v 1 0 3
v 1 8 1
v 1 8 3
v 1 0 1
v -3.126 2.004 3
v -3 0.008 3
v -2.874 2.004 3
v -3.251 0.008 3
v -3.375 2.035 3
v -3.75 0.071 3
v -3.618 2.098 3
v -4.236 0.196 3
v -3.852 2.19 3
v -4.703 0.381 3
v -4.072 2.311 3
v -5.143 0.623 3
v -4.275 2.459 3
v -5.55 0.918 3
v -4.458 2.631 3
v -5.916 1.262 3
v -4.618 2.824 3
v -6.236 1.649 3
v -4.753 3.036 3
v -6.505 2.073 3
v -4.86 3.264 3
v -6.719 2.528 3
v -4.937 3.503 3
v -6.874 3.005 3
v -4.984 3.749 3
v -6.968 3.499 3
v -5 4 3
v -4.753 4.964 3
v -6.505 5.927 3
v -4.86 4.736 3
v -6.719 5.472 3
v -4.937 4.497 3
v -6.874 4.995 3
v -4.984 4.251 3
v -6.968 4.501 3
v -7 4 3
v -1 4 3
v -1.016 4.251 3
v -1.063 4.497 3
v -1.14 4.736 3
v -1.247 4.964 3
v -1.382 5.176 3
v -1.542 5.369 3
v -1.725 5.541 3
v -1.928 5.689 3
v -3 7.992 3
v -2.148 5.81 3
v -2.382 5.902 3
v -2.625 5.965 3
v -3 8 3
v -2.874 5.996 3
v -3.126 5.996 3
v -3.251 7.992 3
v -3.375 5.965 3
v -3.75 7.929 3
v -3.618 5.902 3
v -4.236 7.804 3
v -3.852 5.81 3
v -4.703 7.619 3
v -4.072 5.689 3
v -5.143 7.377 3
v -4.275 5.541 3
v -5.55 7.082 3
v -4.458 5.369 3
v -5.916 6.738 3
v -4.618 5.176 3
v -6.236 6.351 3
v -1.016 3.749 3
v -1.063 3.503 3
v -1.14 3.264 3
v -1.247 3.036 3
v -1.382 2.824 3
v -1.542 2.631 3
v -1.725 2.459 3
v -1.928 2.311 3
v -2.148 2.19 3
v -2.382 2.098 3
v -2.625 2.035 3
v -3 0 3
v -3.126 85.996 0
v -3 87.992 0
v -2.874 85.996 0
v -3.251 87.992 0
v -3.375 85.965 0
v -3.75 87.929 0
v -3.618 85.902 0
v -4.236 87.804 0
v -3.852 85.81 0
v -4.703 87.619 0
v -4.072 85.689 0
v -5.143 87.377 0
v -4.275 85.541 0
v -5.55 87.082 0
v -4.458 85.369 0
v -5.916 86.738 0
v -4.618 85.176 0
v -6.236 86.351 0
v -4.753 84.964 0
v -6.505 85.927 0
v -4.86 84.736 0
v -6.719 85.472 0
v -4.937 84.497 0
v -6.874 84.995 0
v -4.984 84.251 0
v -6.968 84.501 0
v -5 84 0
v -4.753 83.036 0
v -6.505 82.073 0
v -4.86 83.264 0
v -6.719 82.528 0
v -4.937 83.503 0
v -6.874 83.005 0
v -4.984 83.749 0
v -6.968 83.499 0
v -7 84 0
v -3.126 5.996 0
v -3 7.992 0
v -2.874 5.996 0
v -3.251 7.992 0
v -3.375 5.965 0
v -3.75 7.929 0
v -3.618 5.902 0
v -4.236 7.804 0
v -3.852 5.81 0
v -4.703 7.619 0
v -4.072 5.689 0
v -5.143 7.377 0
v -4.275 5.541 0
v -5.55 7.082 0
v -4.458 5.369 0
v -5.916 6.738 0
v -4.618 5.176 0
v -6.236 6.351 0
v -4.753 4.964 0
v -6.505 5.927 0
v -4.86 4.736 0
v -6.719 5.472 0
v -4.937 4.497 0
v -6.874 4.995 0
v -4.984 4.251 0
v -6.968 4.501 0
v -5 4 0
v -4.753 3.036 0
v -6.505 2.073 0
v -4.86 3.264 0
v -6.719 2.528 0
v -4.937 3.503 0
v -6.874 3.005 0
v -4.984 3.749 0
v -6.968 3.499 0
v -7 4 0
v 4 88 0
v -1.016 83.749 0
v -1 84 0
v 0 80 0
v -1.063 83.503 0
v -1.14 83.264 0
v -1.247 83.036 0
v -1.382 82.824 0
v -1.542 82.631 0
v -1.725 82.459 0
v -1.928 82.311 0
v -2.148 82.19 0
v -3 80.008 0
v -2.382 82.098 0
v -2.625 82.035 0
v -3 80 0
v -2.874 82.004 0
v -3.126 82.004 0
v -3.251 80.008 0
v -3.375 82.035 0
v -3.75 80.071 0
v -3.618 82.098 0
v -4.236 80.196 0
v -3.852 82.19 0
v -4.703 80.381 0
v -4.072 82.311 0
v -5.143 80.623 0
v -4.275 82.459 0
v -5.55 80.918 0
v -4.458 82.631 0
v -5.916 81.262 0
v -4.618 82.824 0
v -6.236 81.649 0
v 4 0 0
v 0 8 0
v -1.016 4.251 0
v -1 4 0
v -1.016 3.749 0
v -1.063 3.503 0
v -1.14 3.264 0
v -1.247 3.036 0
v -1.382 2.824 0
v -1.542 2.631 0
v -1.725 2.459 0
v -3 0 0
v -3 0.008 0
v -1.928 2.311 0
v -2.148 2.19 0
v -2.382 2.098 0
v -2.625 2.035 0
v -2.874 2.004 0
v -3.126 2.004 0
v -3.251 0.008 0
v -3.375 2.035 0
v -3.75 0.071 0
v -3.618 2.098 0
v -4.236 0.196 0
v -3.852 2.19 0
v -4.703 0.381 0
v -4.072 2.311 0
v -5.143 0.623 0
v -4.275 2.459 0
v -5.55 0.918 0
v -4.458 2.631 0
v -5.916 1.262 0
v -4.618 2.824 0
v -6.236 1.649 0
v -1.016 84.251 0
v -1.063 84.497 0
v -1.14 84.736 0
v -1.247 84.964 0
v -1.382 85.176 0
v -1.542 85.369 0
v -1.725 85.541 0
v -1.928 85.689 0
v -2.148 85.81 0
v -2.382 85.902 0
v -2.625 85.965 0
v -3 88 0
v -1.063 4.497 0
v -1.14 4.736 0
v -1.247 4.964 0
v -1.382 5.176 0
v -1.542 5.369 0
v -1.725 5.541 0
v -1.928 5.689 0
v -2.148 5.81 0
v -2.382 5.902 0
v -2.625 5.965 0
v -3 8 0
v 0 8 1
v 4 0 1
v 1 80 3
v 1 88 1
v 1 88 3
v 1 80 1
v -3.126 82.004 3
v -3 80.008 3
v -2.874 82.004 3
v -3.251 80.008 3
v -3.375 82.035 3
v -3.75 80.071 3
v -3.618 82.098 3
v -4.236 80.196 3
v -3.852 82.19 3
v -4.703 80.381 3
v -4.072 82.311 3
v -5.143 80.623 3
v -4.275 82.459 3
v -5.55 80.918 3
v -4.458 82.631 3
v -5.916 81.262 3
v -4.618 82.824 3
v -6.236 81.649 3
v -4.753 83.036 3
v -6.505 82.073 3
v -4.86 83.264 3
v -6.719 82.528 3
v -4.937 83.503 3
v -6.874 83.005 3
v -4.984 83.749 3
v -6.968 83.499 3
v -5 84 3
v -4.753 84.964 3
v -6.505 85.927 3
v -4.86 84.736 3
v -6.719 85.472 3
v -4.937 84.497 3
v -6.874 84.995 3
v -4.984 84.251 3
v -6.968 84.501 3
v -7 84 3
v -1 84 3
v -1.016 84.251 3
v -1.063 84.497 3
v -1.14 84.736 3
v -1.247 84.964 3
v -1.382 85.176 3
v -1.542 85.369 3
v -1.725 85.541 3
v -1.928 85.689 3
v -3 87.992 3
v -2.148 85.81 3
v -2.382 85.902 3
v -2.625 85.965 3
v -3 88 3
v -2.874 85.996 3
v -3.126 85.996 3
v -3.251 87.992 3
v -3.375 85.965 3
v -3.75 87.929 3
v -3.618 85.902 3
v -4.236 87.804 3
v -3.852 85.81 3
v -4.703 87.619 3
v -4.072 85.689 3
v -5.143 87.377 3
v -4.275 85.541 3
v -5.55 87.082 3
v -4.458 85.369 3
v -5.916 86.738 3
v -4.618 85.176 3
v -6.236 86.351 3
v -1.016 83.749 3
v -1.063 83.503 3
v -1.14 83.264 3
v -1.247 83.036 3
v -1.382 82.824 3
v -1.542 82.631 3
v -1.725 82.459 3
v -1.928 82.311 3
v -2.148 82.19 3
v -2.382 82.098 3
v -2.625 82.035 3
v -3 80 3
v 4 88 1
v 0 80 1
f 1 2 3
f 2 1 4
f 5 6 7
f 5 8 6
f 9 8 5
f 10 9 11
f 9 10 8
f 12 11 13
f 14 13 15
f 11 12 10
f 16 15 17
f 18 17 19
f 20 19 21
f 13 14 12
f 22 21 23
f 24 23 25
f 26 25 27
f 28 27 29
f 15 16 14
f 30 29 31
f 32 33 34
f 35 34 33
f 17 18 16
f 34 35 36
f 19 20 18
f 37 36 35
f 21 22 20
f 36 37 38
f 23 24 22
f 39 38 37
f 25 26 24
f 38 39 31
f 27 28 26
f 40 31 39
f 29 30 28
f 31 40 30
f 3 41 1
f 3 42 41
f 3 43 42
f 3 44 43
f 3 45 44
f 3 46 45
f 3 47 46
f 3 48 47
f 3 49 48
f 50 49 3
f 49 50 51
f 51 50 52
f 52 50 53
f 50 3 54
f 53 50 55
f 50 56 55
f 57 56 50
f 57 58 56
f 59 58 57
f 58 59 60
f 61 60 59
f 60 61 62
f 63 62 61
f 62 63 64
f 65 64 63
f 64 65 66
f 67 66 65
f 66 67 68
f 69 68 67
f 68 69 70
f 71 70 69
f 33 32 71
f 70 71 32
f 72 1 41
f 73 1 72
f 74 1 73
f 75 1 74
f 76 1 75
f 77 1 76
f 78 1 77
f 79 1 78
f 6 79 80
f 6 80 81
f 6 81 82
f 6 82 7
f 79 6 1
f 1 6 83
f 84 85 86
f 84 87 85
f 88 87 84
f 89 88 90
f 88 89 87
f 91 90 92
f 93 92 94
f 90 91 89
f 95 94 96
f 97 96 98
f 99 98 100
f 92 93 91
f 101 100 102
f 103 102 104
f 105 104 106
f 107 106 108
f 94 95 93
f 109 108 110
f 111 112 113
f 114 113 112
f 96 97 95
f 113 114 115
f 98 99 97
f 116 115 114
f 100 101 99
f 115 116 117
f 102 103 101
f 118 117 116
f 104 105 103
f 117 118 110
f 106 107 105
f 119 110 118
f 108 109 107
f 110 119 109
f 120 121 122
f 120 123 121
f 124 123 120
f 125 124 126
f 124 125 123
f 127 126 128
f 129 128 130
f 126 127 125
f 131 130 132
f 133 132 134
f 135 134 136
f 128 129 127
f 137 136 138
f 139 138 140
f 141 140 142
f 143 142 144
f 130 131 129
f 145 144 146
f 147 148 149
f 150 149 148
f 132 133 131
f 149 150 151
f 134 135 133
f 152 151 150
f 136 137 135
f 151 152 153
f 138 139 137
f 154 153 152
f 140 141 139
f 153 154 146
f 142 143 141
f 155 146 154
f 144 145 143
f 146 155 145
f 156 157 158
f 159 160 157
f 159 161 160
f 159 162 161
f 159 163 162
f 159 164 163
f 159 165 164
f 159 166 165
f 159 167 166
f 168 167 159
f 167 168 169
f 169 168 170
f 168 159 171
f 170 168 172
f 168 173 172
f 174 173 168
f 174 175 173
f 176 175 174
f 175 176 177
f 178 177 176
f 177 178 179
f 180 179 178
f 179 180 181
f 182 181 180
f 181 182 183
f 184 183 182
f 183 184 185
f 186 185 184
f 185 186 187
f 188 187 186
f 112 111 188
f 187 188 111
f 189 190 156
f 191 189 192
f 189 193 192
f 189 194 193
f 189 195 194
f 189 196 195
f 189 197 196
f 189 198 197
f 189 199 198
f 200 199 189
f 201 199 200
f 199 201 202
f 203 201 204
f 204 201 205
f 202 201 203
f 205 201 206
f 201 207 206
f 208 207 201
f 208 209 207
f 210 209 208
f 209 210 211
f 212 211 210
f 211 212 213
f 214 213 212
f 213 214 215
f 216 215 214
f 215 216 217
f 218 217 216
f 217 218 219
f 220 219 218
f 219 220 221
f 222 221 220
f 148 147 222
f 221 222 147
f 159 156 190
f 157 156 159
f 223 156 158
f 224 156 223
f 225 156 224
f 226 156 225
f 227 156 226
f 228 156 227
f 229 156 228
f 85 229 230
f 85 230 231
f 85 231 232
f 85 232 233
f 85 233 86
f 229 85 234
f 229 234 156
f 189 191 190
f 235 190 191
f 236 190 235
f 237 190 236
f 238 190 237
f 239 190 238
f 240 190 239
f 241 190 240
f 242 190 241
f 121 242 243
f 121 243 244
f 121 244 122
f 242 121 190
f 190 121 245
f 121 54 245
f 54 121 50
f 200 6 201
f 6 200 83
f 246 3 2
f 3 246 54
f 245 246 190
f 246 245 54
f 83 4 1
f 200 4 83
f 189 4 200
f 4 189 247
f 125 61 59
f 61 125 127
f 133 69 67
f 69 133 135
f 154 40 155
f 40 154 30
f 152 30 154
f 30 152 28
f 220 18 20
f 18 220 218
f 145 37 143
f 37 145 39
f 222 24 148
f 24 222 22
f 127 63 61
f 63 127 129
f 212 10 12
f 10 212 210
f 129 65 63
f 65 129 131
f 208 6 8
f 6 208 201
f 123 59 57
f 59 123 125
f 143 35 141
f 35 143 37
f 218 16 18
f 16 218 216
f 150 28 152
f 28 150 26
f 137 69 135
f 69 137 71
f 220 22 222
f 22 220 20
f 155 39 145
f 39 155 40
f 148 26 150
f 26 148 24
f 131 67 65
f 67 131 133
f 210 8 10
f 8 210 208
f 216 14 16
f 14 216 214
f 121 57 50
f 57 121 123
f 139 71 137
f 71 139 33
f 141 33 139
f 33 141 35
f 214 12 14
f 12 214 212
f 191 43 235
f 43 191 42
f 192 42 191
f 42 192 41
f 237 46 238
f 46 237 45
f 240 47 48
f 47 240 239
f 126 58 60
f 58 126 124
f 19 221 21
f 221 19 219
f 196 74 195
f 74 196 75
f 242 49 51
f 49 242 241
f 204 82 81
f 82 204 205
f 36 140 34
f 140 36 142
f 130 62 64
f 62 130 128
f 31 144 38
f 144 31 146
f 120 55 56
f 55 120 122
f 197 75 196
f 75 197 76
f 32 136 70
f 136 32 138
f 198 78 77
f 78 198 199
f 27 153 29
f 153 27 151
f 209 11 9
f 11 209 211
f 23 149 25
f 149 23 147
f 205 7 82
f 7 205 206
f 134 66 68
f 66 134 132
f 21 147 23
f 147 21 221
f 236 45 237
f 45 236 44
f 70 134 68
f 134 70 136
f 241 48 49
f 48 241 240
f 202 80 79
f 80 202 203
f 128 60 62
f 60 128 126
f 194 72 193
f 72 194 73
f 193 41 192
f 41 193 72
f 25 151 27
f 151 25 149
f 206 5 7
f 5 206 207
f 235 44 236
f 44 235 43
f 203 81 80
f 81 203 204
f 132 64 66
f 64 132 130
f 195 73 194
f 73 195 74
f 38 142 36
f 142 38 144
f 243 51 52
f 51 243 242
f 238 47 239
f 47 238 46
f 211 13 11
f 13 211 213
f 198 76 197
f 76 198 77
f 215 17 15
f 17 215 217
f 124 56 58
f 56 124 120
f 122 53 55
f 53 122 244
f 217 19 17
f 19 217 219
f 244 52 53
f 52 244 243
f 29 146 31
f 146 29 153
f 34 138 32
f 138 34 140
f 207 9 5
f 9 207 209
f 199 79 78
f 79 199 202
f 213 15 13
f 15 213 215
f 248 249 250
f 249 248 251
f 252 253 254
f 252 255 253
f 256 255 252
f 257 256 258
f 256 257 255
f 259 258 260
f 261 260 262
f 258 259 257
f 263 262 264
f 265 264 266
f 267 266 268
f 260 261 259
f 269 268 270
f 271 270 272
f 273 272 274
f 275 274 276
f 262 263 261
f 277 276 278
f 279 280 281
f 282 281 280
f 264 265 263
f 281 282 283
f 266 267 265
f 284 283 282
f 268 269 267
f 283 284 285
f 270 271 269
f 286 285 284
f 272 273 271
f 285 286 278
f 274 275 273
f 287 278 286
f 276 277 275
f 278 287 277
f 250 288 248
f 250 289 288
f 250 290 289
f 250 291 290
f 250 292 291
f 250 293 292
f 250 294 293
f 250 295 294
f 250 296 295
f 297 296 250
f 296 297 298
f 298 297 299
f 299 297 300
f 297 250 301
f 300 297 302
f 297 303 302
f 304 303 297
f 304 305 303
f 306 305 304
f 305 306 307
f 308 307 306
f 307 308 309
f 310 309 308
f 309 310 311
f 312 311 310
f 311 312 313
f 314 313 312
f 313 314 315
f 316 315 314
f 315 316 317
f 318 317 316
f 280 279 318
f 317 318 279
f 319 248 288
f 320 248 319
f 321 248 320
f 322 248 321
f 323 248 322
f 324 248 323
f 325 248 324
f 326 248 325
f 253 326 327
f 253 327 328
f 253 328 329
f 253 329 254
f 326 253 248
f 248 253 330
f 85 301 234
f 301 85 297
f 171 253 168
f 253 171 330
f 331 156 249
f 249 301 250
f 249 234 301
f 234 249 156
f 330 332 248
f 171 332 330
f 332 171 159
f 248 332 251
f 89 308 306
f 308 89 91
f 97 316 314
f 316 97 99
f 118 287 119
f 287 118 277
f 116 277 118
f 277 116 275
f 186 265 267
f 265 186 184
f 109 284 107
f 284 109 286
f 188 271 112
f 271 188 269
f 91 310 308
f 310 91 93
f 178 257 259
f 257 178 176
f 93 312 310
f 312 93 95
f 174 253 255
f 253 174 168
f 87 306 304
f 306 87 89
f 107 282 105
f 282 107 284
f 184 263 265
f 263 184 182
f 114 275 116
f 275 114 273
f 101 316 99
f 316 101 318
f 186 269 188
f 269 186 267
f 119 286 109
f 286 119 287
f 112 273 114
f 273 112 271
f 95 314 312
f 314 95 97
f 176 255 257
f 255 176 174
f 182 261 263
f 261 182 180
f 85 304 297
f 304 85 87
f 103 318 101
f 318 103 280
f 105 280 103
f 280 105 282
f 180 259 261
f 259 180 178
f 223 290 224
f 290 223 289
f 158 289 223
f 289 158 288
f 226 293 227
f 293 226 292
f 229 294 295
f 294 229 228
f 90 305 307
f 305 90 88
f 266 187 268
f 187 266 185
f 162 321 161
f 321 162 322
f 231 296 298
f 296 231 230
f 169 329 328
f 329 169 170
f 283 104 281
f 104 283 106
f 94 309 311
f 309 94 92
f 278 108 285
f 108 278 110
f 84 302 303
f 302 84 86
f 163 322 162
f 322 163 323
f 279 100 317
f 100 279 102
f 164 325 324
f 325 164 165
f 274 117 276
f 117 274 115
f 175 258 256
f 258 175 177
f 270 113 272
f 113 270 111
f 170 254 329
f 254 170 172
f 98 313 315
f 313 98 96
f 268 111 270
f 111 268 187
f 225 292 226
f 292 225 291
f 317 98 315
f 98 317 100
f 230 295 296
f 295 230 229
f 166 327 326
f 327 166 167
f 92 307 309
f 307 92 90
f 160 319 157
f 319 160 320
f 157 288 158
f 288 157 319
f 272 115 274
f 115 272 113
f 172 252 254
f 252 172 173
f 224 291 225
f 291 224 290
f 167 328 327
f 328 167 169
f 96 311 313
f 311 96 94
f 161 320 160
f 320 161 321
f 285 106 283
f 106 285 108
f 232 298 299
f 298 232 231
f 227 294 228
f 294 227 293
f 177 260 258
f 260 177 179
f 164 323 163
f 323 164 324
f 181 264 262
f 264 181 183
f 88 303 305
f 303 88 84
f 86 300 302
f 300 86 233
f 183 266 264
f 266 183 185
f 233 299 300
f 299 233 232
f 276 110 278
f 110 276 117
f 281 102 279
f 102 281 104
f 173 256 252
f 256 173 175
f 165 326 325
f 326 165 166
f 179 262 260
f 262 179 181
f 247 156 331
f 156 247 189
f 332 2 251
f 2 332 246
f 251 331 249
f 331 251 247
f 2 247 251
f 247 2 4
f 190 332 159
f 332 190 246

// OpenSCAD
// Very simple brace to mount the rouger flush to the wall.
// This just slots into the top groove.

$fn=50;

module screw_holder() {
translate([-3,4,0])
difference() {
   union() {
      translate([0,-4,0])
        cube([4,8,3]);
      cylinder(3, 4, 4);
   }
   cylinder(3, 2, 2);
}
}


for(y = [0, 80])
  translate([0,y,0])
    screw_holder();
cube([4,88,1]);
